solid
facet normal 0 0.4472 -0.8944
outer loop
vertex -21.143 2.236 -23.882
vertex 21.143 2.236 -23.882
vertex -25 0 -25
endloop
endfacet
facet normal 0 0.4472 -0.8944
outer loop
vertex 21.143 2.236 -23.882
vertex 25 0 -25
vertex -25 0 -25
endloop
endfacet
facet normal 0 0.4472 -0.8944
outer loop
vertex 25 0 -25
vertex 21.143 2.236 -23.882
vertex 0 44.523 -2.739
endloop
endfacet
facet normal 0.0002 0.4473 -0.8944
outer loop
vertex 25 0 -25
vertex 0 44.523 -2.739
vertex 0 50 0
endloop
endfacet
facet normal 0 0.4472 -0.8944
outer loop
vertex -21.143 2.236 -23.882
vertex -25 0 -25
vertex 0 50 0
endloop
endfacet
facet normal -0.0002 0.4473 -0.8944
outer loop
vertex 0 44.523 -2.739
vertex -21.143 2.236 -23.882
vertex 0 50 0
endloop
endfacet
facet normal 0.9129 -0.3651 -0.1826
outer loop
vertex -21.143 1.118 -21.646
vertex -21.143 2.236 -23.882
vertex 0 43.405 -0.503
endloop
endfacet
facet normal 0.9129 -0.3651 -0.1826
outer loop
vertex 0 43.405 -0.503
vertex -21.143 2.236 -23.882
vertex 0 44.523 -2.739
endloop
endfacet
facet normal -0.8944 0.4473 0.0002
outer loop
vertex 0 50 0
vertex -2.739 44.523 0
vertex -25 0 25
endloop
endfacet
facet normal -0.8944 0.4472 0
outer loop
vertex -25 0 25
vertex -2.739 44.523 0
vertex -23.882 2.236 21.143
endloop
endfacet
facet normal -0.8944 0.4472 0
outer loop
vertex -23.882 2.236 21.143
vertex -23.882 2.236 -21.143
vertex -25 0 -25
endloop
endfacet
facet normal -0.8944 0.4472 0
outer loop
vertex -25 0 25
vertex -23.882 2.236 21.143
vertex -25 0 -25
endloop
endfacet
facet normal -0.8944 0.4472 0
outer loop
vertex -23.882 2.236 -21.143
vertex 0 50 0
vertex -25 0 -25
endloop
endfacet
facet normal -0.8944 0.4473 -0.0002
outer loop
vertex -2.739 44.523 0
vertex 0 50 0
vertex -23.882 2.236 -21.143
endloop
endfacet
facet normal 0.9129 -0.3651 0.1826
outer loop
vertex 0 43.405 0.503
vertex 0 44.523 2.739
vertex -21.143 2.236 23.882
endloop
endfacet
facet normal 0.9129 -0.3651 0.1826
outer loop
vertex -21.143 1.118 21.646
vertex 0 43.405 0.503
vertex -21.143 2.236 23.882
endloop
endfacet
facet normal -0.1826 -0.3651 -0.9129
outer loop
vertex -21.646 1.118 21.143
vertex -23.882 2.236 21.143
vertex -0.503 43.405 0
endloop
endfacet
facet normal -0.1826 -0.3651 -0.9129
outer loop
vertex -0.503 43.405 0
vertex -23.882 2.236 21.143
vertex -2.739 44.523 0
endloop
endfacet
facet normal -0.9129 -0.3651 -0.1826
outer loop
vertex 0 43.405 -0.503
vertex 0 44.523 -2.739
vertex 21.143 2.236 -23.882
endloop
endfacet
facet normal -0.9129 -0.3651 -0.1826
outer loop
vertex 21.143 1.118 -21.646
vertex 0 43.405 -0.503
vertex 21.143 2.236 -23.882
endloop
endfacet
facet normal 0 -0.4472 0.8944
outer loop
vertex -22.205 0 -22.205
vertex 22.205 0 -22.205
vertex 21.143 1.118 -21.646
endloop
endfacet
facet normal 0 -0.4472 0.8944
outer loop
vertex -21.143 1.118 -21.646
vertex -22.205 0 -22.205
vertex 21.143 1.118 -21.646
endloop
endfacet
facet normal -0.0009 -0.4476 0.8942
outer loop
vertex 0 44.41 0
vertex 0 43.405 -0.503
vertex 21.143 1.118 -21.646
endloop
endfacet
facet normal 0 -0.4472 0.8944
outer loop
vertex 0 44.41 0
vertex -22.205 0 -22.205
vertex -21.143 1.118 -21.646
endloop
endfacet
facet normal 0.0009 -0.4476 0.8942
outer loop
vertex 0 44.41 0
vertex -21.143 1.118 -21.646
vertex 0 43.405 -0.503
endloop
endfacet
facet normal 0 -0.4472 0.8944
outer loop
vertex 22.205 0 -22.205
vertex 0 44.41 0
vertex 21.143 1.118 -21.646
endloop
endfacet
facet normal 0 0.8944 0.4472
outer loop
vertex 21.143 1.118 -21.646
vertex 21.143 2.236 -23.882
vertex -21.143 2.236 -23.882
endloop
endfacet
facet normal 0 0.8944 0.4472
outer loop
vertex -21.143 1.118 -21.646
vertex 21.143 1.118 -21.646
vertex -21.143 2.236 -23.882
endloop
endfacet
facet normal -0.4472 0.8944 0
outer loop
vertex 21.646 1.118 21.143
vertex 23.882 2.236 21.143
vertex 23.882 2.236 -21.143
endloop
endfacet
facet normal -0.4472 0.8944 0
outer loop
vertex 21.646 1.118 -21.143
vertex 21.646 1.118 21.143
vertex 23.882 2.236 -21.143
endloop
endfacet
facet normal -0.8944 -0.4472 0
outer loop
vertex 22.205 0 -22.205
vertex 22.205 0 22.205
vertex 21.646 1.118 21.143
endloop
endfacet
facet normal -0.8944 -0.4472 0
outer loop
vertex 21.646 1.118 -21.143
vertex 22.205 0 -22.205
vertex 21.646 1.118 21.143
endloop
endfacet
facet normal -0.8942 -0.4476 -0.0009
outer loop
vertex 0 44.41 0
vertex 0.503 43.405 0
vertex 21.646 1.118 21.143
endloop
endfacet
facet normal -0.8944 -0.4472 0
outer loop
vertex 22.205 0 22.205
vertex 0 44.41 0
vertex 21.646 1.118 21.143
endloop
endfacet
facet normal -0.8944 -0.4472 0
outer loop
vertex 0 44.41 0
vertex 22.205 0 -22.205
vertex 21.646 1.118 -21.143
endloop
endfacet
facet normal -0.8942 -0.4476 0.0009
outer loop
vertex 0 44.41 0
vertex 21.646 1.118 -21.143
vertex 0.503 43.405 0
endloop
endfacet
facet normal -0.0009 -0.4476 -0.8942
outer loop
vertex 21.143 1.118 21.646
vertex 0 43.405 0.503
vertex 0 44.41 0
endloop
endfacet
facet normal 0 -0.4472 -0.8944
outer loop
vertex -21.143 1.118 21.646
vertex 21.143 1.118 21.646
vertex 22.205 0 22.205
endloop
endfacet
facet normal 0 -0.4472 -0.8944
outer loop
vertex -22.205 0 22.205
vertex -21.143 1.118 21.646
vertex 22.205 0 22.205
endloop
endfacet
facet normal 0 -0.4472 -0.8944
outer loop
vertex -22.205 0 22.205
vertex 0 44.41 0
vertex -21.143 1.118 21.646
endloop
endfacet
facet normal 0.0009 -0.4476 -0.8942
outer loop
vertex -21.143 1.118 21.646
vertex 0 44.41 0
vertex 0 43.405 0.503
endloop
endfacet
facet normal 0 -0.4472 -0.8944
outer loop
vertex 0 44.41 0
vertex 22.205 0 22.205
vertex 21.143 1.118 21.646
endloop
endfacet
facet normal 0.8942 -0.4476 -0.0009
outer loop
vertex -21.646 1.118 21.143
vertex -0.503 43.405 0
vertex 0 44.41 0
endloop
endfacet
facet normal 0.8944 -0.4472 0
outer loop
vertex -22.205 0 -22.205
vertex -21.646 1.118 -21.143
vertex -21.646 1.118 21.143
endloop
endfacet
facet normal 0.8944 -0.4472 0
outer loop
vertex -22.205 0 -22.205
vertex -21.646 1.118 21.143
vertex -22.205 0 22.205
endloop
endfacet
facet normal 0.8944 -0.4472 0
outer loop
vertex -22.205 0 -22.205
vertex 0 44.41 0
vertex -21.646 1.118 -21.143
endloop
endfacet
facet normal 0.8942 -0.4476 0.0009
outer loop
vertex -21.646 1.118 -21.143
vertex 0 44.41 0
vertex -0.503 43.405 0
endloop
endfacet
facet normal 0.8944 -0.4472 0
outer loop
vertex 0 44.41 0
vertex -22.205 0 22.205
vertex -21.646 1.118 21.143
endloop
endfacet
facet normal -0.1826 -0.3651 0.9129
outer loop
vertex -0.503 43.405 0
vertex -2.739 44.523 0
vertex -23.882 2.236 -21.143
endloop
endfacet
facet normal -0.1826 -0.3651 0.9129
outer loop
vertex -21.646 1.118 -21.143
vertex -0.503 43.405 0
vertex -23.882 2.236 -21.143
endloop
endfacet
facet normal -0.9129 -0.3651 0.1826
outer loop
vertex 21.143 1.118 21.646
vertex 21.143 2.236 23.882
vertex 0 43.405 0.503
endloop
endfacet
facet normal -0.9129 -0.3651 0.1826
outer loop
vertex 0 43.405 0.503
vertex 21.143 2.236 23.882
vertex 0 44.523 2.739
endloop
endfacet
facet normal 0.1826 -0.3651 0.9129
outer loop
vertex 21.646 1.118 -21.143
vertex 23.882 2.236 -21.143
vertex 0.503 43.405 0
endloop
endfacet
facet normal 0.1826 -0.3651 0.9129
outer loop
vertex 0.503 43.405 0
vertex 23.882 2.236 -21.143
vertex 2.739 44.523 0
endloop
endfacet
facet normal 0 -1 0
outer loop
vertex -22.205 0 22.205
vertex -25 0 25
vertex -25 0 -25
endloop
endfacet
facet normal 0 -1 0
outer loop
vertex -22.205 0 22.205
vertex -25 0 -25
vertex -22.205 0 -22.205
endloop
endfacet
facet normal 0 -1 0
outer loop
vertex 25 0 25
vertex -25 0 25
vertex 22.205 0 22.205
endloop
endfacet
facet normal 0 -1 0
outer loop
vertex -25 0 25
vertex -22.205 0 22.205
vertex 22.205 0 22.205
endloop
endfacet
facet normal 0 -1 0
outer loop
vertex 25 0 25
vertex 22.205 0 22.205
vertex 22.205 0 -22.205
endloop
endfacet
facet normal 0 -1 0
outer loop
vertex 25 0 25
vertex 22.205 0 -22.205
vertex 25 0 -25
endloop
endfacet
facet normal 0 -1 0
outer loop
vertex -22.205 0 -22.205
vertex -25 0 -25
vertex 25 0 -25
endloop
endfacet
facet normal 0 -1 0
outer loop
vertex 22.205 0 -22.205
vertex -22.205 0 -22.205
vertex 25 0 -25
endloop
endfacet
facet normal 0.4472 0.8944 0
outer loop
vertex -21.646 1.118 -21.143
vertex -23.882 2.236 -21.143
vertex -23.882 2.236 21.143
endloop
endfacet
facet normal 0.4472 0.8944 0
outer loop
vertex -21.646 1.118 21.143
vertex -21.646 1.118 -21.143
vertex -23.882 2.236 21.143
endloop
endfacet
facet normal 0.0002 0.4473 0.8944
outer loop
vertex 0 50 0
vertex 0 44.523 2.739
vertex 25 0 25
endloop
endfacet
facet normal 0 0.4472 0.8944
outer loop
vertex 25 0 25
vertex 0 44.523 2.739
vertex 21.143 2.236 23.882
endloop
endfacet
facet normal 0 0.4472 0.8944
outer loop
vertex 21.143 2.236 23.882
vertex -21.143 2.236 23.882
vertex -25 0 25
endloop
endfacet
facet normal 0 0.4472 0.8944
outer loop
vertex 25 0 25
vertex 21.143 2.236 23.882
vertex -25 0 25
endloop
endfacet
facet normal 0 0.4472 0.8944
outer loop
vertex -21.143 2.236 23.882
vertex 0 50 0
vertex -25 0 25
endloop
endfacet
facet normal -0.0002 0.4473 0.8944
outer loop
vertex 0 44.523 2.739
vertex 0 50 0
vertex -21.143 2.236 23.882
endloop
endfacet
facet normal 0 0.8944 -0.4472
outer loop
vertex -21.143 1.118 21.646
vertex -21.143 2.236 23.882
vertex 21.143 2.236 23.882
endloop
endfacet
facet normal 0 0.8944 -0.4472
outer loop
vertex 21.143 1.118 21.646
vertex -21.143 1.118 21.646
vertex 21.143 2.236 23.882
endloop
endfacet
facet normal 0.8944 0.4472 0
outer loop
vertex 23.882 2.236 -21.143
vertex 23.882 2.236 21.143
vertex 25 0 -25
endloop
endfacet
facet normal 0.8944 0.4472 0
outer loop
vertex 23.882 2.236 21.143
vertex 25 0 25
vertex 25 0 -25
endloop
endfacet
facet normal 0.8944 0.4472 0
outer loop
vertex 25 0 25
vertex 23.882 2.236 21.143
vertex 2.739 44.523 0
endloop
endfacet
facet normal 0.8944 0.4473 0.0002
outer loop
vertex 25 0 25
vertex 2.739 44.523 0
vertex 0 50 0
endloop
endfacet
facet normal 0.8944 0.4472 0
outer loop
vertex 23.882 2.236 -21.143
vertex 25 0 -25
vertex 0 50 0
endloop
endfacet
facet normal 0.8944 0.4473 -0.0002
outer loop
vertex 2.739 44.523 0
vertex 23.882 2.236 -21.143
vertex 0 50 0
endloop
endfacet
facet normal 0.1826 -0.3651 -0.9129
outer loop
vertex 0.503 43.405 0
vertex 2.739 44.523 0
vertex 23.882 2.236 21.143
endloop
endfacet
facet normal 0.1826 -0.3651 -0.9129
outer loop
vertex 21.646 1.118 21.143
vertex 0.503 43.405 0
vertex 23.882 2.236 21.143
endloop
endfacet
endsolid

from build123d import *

# Parameters (mm, degrees)
CROQUIS1_W                 = 50
CROQUIS1_H                 = 50
SALIENTE_EXTRUIR1_DEPTH    = 50
CORTAR_EXTRUIR1_DEPTH      = 50
CORTAR_EXTRUIR2_DEPTH      = 25
CORTAR_EXTRUIR2_DEPTH_BACK = 25
VACIADO1_T                 = -2.5
CORTAR_EXTRUIR3_DEPTH      = 2.5
CORTAR_EXTRUIR4_DEPTH      = 2.5
CORTAR_EXTRUIR5_DEPTH      = 2.5
CORTAR_EXTRUIR6_DEPTH      = 2.5


with BuildPart() as part:
    # Croquis1 → Saliente-Extruir1 (new body)
    with BuildSketch(Plane(origin=(0, 0, 0), x_dir=(1, 0, 0), z_dir=(0, 1, 0))):
        Rectangle(CROQUIS1_W, CROQUIS1_H)
    extrude(amount=SALIENTE_EXTRUIR1_DEPTH)

    # Croquis2 → Cortar-Extruir1 (cut)
    with BuildSketch(Plane.ZY.offset(25)):
        Polygon((-25, 0), (0, 50), (-25, 50), align=None)
        Polygon((0, 50), (25, 0), (25, 50), align=None)
    extrude(amount=-CORTAR_EXTRUIR1_DEPTH, mode=Mode.SUBTRACT)

    # Croquis4 → Cortar-Extruir2 (cut, two sides)
    with BuildSketch(Plane(origin=(0, 0, 0), x_dir=(-1, 0, 0), z_dir=(0, 0, -1))) as cortar_extruir2_sk:
        Polygon((-25, 50), (-25, 0), (0, 50), align=None)
        Polygon((25, 50), (0, 50), (25, 0), align=None)
    extrude(amount=CORTAR_EXTRUIR2_DEPTH, mode=Mode.SUBTRACT)
    extrude(cortar_extruir2_sk.sketch, amount=-CORTAR_EXTRUIR2_DEPTH_BACK, mode=Mode.SUBTRACT)

    # Vaciado1
    vaciado1_openings = [part.faces().sort_by_distance(p)[0] for p in [
        (0, 0, 0),
    ]]
    offset(amount=VACIADO1_T, openings=vaciado1_openings, kind=Kind.INTERSECTION)

    # Croquis6 → Cortar-Extruir3 (cut)
    with BuildSketch(Plane(origin=(0, 10, -20), x_dir=(-1, 0, 0), z_dir=(0, 0.447213595, -0.894427191))):
        Polygon((0, 38.597635193), (-21.143353224, -8.680339887), (21.143353224, -8.680339887), align=None)
    extrude(amount=-CORTAR_EXTRUIR3_DEPTH, mode=Mode.SUBTRACT)

    # Croquis7 → Cortar-Extruir4 (cut)
    with BuildSketch(Plane(origin=(-20, 10, 0), x_dir=(0, 0, 1), z_dir=(-0.894427191, 0.447213595, 0))):
        Polygon((-21.143353224, -8.680339887), (21.143353224, -8.680339887), (0, 38.597635193), align=None)
    extrude(amount=-CORTAR_EXTRUIR4_DEPTH, mode=Mode.SUBTRACT)

    # Croquis8 → Cortar-Extruir5 (cut)
    with BuildSketch(Plane(origin=(0, 10, 20), x_dir=(1, 0, 0), z_dir=(0, 0.447213595, 0.894427191))):
        Polygon((-21.143353224, -8.680339887), (21.143353224, -8.680339887), (0, 38.597635193), align=None)
    extrude(amount=-CORTAR_EXTRUIR5_DEPTH, mode=Mode.SUBTRACT)

    # Croquis9 → Cortar-Extruir6 (cut)
    with BuildSketch(Plane(origin=(20, 10, 0), x_dir=(0, 0, -1), z_dir=(0.894427191, 0.447213595, 0))):
        Polygon((21.143353224, -8.680339887), (0, 38.597635193), (-21.143353224, -8.680339887), align=None)
    extrude(amount=-CORTAR_EXTRUIR6_DEPTH, mode=Mode.SUBTRACT)


solid = part.part
